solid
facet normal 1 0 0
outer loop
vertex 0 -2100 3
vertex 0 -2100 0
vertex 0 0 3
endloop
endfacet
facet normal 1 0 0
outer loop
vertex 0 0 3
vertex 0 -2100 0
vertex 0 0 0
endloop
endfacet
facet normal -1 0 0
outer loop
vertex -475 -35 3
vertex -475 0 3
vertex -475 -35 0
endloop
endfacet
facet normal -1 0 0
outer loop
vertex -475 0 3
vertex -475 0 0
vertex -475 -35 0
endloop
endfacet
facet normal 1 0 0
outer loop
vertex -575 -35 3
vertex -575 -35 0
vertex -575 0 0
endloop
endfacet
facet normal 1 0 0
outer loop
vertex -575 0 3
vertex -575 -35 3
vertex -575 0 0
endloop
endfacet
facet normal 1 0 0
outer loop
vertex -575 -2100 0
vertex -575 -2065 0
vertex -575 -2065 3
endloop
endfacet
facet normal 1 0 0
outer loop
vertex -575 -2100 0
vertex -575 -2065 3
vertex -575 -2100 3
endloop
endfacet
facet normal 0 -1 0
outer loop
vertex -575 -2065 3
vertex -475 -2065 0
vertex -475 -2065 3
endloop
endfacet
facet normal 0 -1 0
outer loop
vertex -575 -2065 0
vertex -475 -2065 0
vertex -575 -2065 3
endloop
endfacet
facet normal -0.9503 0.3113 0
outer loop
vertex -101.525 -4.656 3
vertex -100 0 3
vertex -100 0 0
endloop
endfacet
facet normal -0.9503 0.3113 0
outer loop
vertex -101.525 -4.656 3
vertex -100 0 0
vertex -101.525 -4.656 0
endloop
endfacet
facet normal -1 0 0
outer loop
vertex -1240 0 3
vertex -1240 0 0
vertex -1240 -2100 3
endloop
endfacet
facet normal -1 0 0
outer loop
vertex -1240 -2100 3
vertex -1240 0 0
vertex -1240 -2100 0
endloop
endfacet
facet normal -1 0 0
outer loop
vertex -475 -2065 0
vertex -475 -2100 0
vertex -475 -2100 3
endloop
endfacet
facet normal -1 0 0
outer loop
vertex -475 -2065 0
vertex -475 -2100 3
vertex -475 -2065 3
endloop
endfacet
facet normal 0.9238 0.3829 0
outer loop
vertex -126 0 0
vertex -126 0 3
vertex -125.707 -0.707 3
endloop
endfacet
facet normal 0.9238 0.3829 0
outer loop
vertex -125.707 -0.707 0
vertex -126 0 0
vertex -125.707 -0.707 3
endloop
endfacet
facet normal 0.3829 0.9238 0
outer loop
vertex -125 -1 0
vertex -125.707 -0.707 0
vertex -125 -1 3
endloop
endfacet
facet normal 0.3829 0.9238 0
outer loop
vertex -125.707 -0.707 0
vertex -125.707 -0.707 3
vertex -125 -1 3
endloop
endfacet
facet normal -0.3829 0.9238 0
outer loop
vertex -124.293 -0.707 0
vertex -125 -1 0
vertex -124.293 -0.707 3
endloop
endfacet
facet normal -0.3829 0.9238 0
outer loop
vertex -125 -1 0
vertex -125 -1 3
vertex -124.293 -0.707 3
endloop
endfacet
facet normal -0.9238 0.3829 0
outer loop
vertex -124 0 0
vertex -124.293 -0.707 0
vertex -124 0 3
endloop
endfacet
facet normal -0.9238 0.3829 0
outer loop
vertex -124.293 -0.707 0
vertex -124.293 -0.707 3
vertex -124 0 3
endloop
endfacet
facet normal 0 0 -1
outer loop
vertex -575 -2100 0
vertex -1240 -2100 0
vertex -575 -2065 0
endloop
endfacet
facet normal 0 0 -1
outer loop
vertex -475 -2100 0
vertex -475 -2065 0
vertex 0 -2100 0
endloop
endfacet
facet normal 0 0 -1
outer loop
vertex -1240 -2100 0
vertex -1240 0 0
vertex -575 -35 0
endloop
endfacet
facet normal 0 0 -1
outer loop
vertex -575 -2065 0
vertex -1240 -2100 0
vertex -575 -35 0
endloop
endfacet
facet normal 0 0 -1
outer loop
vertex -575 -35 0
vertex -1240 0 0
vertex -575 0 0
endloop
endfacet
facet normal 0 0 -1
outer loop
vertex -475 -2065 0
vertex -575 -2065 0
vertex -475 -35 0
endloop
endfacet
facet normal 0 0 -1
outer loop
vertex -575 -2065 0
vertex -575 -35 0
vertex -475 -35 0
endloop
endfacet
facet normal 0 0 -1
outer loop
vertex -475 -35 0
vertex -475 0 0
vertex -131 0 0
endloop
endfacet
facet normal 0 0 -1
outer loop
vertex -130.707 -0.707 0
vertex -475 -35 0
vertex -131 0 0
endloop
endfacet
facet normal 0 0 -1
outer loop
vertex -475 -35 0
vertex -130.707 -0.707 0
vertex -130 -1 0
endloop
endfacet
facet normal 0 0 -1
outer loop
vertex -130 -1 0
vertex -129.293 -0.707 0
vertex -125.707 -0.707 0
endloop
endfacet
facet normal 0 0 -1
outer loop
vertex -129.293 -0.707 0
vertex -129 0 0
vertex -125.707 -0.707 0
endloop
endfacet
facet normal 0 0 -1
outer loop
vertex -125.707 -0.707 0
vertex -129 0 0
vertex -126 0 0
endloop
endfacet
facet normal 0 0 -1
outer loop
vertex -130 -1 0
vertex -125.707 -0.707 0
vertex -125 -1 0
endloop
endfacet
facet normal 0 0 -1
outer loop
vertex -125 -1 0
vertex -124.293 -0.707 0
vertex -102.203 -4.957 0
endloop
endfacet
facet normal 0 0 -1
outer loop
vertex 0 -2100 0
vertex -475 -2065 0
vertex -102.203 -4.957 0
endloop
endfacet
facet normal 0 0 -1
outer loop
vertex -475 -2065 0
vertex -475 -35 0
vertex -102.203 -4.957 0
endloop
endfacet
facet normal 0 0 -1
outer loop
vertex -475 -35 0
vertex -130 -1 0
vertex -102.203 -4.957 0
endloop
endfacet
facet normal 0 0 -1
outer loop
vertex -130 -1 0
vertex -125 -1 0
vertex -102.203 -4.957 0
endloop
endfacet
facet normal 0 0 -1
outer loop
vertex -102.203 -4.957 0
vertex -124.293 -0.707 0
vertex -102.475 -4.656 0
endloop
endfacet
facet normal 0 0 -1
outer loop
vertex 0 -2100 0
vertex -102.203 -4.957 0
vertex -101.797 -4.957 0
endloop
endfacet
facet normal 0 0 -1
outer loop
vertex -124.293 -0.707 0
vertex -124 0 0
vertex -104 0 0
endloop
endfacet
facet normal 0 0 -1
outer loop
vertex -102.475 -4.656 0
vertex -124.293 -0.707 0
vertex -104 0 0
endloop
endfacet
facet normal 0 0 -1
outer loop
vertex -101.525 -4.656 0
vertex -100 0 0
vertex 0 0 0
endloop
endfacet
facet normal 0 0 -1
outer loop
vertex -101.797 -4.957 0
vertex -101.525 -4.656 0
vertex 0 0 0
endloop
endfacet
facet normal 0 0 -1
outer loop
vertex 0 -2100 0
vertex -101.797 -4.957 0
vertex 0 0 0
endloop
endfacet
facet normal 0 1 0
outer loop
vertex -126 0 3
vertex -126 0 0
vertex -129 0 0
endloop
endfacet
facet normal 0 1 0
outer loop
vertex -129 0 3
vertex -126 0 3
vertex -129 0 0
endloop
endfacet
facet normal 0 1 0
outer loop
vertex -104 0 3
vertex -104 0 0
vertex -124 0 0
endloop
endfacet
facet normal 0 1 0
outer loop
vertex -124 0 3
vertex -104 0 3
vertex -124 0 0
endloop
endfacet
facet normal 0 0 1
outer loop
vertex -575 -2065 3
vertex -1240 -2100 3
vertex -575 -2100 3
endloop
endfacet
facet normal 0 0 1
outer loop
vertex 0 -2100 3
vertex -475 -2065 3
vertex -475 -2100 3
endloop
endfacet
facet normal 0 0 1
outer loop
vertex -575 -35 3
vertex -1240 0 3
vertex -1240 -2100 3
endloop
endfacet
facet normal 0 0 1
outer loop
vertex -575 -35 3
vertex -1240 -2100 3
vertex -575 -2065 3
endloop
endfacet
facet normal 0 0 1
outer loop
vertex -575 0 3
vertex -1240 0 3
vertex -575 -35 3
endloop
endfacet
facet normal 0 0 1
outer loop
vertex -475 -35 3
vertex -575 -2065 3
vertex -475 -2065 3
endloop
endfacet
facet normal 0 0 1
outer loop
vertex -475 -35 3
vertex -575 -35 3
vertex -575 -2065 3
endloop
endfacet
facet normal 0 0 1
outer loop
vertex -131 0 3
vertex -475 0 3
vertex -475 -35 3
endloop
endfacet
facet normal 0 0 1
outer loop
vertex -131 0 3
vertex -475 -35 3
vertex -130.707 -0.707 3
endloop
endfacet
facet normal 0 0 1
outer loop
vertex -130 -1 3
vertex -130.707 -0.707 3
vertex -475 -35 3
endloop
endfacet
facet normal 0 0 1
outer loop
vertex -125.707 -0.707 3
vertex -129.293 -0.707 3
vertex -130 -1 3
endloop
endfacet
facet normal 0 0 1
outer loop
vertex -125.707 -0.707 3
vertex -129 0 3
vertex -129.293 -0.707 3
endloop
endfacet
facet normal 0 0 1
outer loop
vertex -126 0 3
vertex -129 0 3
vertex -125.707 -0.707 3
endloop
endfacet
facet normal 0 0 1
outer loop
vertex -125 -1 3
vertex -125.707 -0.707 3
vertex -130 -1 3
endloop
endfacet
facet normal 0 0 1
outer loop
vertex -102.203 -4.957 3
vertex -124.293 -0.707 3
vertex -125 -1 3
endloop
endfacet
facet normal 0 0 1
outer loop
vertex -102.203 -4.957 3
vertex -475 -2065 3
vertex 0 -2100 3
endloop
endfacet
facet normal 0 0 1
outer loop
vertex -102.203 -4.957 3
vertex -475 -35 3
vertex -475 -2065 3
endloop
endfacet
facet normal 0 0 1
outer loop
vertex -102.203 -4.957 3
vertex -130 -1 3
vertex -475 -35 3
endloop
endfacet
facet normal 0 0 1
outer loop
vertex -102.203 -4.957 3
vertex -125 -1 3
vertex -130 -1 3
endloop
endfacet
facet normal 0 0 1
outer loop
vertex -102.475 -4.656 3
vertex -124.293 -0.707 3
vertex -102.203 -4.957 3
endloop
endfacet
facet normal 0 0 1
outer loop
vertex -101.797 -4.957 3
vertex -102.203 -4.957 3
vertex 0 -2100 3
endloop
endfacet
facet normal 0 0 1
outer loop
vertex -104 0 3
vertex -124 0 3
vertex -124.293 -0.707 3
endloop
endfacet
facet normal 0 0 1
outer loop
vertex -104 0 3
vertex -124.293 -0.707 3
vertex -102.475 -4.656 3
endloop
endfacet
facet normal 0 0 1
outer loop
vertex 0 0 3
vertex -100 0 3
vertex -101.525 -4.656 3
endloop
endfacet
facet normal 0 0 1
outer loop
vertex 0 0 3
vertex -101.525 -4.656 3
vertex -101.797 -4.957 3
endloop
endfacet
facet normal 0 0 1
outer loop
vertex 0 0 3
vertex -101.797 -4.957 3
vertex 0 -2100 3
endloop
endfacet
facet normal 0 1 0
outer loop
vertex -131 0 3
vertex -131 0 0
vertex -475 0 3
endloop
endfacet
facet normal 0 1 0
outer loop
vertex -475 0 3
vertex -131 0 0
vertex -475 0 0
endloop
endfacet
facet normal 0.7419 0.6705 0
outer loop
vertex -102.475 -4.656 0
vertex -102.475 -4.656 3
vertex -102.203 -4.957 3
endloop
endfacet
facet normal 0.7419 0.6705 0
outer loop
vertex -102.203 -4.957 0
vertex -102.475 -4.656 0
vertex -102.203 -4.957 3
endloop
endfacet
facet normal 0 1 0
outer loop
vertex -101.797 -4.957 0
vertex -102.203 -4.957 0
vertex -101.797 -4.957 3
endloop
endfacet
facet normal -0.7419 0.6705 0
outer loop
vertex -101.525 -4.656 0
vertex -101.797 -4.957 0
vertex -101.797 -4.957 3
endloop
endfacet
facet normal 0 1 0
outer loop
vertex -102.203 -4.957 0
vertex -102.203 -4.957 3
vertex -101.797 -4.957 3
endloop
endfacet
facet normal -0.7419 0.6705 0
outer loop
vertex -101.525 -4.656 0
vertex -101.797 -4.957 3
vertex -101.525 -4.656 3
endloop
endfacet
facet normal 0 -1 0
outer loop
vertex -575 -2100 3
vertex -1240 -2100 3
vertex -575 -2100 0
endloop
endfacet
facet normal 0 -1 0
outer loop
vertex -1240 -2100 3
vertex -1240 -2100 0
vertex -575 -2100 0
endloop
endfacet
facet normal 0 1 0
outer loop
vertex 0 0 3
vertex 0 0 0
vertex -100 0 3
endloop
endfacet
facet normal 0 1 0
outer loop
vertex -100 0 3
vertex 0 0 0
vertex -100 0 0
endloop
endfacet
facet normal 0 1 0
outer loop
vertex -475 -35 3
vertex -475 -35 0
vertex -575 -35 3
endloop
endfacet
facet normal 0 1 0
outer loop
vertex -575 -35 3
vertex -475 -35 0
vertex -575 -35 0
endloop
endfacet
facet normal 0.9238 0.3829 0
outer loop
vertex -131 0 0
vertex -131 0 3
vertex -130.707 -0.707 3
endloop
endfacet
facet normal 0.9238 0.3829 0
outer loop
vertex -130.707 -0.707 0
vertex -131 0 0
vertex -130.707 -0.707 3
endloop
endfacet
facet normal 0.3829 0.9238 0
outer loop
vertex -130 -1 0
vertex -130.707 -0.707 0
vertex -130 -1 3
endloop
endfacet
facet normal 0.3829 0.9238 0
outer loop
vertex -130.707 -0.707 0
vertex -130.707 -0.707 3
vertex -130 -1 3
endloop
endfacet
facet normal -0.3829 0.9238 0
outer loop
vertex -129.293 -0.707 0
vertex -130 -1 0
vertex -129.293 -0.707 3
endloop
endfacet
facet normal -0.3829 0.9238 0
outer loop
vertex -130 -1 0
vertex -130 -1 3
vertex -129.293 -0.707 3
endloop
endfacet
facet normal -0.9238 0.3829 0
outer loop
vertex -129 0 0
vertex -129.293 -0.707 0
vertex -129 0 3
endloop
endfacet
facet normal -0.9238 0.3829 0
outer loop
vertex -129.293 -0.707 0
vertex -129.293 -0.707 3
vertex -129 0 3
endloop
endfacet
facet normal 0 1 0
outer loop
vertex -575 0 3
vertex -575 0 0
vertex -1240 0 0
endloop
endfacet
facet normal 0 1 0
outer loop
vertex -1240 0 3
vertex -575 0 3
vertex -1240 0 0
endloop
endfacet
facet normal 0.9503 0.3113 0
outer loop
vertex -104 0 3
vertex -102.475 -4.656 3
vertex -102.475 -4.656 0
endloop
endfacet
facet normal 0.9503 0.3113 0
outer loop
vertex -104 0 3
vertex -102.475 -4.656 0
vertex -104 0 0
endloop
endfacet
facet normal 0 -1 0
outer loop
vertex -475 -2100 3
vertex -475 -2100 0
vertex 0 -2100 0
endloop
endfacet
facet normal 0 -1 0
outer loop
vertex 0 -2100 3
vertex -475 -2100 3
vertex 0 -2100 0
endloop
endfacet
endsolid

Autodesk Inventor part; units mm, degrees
ref_plane "YZ Plane" through (0, 0, 0) normal (1, 0, 0) x (0, 1, 0)
ref_plane "XZ Plane" through (0, 0, 0) normal (0, 1, 0) x (-1, 0, 0)
ref_plane "XY Plane" through (0, 0, 0) normal (0, 0, 1) x (1, 0, 0)
sketch "Sketch1" plane through (0, 0, 0) normal (0, 0, 1) x (1, 0, 0)
  line L0 (0, 0) -> (-1240, 0)
  line L1 (-1240, 0) -> (-1240, -2100)
  line L2 (-1240, -2100) -> (0, -2100)
  line L3 (0, -2100) -> (0, 0)
  line L4 (0, 0) -> (-65, 0)
  line L5 (-65, 0) -> (-65, -35)
  line L6 (-65, -35) -> (0, -35)
  line L7 (0, -35) -> (0, 0)
  line L8 (0, -2100) -> (-65, -2100)
  line L9 (-65, -2100) -> (-65, -2065)
  line L10 (-65, -2065) -> (0, -2065)
  line L11 (0, -2065) -> (0, -2100)
  line L12 (-1240, 0) -> (-1175, 0)
  line L13 (-1175, 0) -> (-1175, -35)
  line L14 (-1175, -35) -> (-1240, -35)
  line L15 (-1240, -35) -> (-1240, 0)
  line L16 (-1240, -2100) -> (-1175, -2100)
  line L17 (-1175, -2100) -> (-1175, -2065)
  line L18 (-1175, -2065) -> (-1240, -2065)
  line L19 (-1240, -2065) -> (-1240, -2100)
  line L20 (-575, -2100) -> (-475, -2100)
  line L21 (-475, -2100) -> (-475, -2065)
  line L22 (-475, -2065) -> (-575, -2065)
  line L23 (-575, -2065) -> (-575, -2100)
  line L24 (-575, 0) -> (-475, 0)
  line L25 (-475, 0) -> (-475, -35)
  line L26 (-475, -35) -> (-575, -35)
  line L27 (-575, -35) -> (-575, 0)
  point P0 (0, -35)
  point P1 (-65, 0)
  point P2 (-65, -2100)
  point P3 (0, -2065)
  point P4 (-475, -2100)
  point P5 (-475, 0)
  point P6 (-1175, 0)
  point P7 (-1175, -2100)
  dimension "d22" = 1240
  dimension "d23" = 2100
  dimension "d24" = 65
  dimension "d25" = 35
  dimension "d28" = 100
  dimension "d29" = 410
extrude "Plate1" add sketch "Sketch1" along normal blind 3 contours L3 L6 L5 L0 | L5 L6 L3 L10 L9 L2 L21 L22 L23 L17 L18 L1 L14 L13 L0 L27 L26 L25 | L3 L2 L9 L10 | L13 L14 L1 L0 | L18 L17 L2 L1
sketch "Sketch5" plane through (0, 0, 3) normal (0, 0, 1) x (1, 0, 0)
  line L0 (0, 0) -> (-100, 0) construction
  line L1 (-100, 0) -> (-100, -2) construction
  line L2 (-100, -2) -> (0, -2) construction
  line L3 (0, -2) -> (0, 0) construction
  line L4 (-100, 0) -> (-101.5248, -4.6556)
  arc A0 (-102.4752, -4.6556) -> (-101.5248, -4.6556) centre (-102, -4.5) ccw
  line L5 (-102.4752, -4.6556) -> (-104, 0)
  line L6 (-104, 0) -> (-100, 0)
  line L7 (-104, 0) -> (-106, 0) construction
  line L8 (-106, 0) -> (-108, 0)
  line L9 (-108, 0) -> (-108, -5)
  line L10 (-108, -5) -> (-106, -5)
  line L11 (-106, -5) -> (-106, 0)
  line L12 (-108, 0) -> (-110, 0) construction
  line L13 (-110, 0) -> (-112, 0)
  line L14 (-112, 0) -> (-112, -5)
  line L15 (-112, -5) -> (-110, -5)
  line L16 (-110, -5) -> (-110, 0)
  line L17 (-112, 0) -> (-114, 0) construction
  line L18 (-114, 0) -> (-116, 0)
  line L19 (-116, 0) -> (-116, -5)
  line L20 (-116, -5) -> (-114, -5)
  line L21 (-114, -5) -> (-114, 0)
  line L22 (-116, 0) -> (-118, 0) construction
  line L23 (-118, 0) -> (-120, 0)
  line L24 (-120, 0) -> (-120, -5)
  line L25 (-120, -5) -> (-118, -5)
  line L26 (-118, -5) -> (-118, 0)
  line L27 (-120, 0) -> (-125, 0) construction
  line L28 (-125, 0) -> (-130, 0) construction
  circle A1 centre (-125, 0) radius 1
  circle A2 centre (-130, 0) radius 1
  point P0 (0, 0)
  point P1 (-102, 0)
  dimension "d30" = 100
  dimension "d31" = 2
  dimension "d32" = 5
  dimension "d33" = 4
  dimension "d34" = 0.5
  dimension "d35" = 5
  dimension "d36" = 5
  dimension "d37" = 5
  dimension "d38" = 2
extrude "Cut1" cut sketch "Sketch5" against normal blind 3 contours L4 A0 L5 L6 | A1 | A2
equation "\"d33\" = 2 * d31"
equation "\"d34\" = 0.25 * d31"
equation "\"d38\" = d31"
equation "\"d39\" = Thickness"
equation "\"d2\" = Thickness"
equation "\"BendReliefWidth\" = Thickness"
equation "\"BendReliefDepth\" = 0.5 * Thickness"
equation "\"CornerReliefSize\" = 4 * Thickness"
equation "\"MinimumRemnant\" = 2 * Thickness"
equation "\"TransitionRadius\" = BendRadius"
equation "\"JacobiRadiusSize\" = BendRadius"
equation "\"GapSize\" = Thickness"
equation "\"Thickness\" = 3"
equation "\"BendRadius\" = 5"
properties part number "GnG frame 2 floor sheet 8" material "Stainless Steel"
